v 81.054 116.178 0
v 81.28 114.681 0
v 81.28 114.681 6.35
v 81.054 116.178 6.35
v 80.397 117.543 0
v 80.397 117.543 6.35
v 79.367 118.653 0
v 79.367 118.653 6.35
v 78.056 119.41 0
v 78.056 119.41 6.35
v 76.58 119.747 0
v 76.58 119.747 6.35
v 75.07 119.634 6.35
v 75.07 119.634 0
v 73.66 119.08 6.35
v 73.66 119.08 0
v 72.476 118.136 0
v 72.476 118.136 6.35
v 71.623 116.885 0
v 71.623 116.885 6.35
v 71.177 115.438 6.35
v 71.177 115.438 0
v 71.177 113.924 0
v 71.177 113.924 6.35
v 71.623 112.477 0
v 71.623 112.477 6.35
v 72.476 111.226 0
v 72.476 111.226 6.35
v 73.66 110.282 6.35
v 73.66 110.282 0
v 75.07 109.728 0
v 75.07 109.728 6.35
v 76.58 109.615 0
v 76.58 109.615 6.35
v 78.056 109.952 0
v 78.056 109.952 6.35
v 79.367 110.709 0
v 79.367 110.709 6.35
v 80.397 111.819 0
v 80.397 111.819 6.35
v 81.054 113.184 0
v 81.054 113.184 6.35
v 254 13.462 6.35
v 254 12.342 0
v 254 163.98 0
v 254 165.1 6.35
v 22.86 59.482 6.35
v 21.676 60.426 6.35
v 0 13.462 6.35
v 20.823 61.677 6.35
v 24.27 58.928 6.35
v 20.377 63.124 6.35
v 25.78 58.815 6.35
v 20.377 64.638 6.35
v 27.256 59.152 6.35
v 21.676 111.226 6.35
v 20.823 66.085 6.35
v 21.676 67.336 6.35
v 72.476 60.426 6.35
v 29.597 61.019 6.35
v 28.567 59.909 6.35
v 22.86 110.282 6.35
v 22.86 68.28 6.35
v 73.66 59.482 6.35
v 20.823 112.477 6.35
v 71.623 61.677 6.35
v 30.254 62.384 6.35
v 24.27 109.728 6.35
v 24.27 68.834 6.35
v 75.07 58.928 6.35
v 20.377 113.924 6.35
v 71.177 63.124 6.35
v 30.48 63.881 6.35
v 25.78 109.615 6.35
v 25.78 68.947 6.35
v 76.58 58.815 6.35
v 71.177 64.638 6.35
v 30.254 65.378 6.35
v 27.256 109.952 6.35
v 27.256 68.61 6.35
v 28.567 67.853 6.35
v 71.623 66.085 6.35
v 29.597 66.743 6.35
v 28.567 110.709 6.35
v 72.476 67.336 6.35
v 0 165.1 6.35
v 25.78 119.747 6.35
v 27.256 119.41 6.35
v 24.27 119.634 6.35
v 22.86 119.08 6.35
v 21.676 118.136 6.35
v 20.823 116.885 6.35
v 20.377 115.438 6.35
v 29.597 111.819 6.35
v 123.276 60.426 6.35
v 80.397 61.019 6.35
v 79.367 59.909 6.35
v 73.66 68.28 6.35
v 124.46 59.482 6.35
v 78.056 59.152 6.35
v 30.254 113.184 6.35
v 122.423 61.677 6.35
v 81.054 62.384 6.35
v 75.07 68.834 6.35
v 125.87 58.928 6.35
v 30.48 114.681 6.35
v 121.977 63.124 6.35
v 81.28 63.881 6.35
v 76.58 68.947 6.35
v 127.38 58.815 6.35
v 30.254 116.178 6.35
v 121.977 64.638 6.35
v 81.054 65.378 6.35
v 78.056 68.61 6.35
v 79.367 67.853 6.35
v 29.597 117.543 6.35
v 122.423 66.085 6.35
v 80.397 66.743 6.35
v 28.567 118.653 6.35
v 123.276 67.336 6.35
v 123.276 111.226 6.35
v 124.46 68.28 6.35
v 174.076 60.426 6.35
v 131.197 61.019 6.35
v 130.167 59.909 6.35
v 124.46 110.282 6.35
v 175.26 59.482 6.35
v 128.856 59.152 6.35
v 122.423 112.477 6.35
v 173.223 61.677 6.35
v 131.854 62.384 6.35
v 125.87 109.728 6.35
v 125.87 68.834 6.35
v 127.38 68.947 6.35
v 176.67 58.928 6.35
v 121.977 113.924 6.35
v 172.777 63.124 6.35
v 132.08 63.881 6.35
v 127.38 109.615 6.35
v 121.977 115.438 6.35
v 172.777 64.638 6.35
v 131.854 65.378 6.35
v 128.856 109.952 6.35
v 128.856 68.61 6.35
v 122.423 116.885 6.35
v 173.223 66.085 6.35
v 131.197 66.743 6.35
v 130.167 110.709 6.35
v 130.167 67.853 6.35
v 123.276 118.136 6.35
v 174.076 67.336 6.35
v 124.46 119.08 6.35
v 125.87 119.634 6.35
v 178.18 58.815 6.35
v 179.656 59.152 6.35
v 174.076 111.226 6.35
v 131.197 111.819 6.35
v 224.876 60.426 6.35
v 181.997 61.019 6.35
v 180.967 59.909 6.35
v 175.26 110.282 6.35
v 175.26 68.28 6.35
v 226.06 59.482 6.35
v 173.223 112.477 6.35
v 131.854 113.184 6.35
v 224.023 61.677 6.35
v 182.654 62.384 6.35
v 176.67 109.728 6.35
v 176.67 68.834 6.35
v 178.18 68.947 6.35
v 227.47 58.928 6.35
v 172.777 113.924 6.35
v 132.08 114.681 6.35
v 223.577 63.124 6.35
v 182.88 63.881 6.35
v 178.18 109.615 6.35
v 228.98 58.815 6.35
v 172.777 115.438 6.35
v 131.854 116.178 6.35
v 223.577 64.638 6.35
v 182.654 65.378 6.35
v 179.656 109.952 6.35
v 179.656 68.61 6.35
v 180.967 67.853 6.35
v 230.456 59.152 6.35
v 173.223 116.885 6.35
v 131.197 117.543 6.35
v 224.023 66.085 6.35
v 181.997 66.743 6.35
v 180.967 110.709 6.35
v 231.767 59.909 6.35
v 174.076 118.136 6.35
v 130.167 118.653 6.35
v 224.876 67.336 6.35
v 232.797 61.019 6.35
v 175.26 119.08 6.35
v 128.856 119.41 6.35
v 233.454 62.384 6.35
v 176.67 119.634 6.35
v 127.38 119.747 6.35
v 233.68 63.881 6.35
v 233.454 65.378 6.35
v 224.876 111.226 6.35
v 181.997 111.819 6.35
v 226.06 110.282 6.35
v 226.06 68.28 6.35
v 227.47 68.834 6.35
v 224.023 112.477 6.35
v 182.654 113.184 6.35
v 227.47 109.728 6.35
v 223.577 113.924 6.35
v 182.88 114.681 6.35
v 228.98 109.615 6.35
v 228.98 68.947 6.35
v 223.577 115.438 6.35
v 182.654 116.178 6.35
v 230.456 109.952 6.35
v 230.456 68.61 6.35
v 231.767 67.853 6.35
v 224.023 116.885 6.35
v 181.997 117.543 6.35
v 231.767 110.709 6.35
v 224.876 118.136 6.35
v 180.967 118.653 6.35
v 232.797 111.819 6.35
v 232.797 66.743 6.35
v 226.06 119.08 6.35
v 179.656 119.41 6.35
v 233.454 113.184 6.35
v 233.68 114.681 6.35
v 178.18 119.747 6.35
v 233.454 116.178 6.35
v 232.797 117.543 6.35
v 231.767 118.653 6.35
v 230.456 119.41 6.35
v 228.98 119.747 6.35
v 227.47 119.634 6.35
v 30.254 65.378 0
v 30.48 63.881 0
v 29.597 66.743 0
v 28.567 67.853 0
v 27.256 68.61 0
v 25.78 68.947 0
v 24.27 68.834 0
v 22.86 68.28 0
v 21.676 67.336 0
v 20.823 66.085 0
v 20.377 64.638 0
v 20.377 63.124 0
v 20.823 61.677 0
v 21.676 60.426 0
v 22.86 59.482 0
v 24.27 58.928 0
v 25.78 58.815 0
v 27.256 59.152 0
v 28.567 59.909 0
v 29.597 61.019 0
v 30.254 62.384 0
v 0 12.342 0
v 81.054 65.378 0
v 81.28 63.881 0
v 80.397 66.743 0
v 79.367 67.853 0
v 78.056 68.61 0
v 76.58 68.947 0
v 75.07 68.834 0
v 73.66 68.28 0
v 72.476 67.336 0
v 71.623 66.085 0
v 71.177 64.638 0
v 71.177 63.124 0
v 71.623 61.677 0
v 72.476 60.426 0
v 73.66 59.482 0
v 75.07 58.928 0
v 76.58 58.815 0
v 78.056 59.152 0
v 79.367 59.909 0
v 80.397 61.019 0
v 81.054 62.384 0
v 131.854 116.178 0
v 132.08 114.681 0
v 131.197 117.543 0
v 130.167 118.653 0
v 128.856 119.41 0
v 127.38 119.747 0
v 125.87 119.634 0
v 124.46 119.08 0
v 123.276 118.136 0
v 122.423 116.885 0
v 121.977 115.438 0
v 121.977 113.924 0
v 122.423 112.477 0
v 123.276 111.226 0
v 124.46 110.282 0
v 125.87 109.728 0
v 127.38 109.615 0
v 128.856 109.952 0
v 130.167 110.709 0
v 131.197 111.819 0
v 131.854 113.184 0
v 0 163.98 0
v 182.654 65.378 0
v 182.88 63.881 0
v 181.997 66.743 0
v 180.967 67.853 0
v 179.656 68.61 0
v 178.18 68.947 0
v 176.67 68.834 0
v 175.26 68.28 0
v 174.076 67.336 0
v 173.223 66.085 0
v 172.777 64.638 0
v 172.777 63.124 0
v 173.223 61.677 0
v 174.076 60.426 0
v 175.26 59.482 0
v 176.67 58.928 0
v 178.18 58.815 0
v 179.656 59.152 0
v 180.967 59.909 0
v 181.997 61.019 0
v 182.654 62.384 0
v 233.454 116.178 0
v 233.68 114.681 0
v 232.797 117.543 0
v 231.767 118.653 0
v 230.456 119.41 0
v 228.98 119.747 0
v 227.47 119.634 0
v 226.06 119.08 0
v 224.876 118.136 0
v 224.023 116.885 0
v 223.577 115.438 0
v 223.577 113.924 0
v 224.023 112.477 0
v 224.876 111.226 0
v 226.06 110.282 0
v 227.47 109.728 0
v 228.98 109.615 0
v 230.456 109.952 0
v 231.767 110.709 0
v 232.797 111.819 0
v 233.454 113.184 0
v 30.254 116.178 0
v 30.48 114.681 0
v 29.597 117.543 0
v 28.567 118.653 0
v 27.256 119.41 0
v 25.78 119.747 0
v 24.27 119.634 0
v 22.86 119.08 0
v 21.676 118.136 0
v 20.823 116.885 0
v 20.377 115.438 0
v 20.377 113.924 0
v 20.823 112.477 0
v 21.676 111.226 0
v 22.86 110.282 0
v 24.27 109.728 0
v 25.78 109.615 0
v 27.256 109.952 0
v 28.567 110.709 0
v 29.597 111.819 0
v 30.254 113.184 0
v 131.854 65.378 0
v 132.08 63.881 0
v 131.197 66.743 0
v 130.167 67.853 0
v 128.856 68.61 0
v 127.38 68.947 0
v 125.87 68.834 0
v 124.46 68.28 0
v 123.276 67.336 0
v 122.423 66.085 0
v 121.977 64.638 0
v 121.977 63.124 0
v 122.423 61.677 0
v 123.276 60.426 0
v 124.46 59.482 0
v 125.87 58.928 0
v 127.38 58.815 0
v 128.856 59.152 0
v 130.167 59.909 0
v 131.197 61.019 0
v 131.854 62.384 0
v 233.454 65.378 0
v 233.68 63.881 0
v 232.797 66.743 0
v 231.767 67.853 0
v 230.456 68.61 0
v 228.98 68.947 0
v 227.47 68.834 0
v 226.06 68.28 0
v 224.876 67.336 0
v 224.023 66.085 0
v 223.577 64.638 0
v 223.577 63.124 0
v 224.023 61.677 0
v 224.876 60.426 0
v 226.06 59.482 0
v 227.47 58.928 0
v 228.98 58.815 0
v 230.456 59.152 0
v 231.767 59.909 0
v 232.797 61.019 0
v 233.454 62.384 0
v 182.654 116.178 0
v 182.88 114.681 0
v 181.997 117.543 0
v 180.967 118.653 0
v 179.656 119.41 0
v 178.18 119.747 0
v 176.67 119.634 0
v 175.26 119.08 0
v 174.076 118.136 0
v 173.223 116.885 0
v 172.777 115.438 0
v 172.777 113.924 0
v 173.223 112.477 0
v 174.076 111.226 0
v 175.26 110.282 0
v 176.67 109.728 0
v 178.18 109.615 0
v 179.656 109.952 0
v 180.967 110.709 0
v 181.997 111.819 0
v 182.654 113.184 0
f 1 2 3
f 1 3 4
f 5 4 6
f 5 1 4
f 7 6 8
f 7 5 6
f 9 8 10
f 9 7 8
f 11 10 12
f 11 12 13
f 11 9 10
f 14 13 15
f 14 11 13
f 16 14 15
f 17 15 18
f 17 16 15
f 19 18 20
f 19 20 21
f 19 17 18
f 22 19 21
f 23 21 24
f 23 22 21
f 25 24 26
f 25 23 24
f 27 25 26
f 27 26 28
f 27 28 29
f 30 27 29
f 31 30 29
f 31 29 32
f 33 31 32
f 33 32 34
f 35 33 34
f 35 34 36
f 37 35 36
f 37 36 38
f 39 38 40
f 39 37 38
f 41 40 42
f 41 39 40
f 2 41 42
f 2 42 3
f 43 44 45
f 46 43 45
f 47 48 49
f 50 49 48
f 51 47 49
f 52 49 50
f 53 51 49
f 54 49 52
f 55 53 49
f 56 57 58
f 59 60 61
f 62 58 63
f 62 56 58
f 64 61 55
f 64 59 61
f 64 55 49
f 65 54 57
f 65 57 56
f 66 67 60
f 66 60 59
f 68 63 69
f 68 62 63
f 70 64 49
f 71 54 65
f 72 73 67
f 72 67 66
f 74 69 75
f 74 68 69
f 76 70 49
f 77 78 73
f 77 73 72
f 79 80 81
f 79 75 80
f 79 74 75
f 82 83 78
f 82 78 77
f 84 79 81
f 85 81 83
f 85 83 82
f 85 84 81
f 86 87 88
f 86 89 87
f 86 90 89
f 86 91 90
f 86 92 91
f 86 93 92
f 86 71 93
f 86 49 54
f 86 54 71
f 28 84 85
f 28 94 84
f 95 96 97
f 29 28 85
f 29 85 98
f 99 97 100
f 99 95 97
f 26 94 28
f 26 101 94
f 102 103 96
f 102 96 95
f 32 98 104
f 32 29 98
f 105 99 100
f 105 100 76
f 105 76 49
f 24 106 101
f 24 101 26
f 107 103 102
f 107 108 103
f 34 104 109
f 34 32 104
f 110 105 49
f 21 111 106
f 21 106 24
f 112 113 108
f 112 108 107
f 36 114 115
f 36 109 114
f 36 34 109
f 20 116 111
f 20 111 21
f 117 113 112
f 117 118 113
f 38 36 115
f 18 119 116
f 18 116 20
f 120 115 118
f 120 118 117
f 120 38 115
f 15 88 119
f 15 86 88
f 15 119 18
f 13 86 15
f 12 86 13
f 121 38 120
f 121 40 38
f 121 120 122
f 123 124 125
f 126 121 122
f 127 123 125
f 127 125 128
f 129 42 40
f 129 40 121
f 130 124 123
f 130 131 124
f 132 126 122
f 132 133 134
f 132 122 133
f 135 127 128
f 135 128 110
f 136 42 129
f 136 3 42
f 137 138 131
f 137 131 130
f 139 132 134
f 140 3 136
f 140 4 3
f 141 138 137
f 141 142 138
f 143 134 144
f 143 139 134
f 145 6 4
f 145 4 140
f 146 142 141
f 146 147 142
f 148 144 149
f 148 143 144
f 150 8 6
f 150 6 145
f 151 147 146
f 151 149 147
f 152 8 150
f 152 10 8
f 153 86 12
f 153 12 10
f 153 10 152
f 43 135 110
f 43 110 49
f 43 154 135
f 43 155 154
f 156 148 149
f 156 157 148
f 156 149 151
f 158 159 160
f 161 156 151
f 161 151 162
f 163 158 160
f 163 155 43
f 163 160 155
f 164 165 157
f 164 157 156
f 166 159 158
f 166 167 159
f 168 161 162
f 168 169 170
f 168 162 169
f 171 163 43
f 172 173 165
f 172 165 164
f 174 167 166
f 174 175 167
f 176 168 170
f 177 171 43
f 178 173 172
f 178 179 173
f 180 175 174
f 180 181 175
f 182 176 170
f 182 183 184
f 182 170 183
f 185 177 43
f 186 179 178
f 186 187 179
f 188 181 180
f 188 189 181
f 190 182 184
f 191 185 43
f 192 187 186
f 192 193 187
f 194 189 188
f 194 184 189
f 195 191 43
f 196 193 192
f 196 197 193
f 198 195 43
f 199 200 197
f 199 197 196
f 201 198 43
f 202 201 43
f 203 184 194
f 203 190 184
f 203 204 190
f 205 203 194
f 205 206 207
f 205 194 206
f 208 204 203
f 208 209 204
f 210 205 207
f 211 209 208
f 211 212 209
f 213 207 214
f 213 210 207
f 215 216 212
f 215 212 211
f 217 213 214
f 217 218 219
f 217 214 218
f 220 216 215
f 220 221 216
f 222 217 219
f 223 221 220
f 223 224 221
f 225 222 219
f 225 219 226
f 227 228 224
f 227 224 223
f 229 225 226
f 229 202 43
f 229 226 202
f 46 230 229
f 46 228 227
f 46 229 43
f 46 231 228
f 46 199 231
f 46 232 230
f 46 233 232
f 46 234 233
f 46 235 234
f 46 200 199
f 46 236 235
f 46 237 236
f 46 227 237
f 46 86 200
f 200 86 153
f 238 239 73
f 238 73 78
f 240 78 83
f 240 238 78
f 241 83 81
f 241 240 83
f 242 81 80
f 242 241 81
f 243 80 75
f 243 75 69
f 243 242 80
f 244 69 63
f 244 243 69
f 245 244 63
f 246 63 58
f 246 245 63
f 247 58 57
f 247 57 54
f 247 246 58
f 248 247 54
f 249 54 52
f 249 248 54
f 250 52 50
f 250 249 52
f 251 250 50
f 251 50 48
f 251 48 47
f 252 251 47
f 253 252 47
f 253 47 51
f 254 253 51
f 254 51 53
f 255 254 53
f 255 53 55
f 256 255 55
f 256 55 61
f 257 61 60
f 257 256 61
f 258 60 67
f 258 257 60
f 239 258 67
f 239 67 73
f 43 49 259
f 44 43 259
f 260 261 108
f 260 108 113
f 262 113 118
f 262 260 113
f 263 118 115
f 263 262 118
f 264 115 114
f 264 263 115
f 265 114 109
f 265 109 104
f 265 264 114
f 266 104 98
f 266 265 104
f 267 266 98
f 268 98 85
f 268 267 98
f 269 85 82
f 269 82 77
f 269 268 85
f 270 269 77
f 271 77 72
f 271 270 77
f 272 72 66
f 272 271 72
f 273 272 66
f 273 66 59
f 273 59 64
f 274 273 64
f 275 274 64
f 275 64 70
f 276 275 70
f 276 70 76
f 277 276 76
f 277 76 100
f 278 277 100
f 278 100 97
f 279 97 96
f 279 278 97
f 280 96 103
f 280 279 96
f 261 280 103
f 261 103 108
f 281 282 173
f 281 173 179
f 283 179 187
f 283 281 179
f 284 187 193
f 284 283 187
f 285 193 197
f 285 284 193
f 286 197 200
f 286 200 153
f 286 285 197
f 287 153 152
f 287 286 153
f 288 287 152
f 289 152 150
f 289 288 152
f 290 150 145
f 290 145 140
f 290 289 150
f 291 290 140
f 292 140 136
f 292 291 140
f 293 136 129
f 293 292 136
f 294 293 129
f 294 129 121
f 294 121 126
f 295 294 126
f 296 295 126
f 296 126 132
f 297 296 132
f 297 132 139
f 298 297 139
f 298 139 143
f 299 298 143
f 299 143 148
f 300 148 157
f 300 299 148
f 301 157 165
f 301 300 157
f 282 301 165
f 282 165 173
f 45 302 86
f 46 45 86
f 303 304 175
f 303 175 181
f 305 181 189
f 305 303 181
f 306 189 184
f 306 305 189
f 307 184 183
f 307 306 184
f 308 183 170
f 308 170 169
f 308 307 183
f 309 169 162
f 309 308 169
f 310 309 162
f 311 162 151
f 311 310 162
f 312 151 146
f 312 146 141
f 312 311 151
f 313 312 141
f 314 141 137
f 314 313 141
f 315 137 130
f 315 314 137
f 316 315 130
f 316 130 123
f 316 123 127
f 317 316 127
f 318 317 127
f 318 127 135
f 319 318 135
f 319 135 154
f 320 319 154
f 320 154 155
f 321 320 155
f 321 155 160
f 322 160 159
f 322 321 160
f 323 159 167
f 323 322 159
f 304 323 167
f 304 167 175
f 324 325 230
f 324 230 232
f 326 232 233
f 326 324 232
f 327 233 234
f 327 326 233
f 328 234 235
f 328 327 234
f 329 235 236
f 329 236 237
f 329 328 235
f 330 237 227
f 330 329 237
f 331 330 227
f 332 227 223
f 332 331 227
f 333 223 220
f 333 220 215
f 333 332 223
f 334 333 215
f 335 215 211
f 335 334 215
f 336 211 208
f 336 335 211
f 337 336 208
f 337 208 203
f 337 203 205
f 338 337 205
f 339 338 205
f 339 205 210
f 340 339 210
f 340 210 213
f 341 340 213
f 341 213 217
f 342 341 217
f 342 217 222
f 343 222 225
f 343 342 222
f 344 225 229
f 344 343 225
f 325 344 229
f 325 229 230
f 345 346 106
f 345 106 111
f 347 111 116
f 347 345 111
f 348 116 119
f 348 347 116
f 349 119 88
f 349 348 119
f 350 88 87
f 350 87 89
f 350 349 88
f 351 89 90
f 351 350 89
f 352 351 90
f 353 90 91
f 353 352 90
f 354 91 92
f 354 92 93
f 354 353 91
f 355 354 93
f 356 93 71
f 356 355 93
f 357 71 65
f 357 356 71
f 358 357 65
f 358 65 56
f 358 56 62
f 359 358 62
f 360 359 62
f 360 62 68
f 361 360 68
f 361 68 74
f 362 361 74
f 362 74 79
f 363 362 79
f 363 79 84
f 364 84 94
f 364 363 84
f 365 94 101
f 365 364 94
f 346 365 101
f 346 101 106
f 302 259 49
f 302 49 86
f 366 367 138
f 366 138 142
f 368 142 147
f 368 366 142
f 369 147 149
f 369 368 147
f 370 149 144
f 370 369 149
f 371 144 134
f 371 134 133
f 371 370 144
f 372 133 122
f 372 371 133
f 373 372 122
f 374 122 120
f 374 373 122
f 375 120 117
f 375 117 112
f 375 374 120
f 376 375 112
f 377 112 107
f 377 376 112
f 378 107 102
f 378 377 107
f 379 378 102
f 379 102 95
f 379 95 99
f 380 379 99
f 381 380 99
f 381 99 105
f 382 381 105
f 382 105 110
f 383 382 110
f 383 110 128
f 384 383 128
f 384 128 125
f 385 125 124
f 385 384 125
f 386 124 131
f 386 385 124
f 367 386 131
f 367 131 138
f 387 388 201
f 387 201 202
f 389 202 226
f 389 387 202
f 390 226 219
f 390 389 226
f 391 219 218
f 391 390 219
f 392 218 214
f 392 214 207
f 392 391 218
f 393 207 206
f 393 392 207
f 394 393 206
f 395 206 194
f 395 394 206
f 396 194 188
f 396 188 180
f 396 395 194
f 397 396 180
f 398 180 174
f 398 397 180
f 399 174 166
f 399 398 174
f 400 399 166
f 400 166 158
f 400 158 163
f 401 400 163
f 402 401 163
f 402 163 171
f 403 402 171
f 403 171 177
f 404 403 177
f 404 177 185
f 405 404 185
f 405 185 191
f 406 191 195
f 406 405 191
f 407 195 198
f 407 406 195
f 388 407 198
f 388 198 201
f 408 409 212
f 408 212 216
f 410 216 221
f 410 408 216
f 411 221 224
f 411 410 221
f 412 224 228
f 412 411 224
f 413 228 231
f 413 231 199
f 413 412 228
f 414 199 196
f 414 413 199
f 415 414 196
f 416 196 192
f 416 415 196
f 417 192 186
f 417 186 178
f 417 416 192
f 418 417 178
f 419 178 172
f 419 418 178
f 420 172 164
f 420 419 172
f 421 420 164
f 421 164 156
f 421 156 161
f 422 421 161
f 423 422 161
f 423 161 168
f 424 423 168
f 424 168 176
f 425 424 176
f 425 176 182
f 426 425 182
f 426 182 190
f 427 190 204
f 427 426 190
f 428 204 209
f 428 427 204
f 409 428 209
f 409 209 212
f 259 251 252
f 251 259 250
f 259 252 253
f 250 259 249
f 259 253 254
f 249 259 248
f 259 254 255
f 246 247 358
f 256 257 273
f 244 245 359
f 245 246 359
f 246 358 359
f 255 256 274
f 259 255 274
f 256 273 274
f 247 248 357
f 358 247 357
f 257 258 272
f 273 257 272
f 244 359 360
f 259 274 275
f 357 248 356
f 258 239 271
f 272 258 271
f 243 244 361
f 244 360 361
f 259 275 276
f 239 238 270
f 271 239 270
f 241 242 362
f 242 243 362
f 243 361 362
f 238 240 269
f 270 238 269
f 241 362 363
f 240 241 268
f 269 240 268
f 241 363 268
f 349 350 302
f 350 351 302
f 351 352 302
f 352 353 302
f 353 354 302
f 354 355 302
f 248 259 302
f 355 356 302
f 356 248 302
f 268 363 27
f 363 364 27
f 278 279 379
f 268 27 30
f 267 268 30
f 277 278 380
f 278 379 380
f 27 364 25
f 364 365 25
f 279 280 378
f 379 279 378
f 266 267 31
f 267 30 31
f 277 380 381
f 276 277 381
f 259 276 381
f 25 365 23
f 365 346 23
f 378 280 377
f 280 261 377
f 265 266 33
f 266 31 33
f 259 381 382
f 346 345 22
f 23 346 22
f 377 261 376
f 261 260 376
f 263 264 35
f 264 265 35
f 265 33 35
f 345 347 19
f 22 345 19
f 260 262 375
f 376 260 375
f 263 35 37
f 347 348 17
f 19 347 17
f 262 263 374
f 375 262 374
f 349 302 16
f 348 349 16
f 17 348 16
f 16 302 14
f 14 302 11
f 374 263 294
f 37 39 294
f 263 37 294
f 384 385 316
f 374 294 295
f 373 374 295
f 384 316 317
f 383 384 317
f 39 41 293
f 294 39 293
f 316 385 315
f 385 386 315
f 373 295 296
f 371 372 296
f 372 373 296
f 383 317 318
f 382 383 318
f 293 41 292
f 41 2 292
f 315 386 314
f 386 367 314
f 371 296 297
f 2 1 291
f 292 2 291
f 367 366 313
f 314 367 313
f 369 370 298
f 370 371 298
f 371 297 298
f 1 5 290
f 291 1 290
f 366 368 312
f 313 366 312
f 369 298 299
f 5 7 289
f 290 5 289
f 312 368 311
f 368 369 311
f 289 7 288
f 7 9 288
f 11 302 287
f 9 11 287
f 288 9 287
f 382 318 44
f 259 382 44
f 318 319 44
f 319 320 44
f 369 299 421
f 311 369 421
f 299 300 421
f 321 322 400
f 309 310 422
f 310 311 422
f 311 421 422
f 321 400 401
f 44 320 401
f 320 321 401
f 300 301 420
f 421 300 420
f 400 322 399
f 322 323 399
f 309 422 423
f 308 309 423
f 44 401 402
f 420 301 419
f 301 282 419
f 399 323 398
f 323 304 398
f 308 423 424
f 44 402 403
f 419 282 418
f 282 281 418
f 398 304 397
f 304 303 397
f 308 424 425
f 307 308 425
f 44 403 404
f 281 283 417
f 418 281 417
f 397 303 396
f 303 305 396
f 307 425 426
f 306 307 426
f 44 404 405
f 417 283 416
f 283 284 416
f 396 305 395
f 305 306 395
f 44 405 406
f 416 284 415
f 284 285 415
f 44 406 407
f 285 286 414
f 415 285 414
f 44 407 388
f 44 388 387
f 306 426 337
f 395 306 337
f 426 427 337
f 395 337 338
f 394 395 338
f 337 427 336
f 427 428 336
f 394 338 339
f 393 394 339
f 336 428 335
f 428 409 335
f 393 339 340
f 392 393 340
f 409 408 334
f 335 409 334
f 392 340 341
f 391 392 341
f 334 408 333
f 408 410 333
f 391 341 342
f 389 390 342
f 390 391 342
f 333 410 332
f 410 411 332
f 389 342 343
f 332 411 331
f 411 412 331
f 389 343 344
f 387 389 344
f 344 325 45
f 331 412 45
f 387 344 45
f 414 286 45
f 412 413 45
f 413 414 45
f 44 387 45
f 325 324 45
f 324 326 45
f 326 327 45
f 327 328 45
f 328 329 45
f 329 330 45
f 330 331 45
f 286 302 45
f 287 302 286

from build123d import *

# Parameters (mm, degrees)
F0_W     = 254
F0_H     = 165.1
F0_R     = 5.08
F1_DEPTH = 6.35
F3_DEPTH = 254.001
F5_DEPTH = 254.001


with BuildPart() as f1:
    # F0 (on Top) → F1 (new body)
    with BuildSketch(Plane.XY):
        with Locations((127, 82.55)):
            Rectangle(F0_W, F0_H)
        with Locations((25.4, 63.881)):
            Circle(F0_R, mode=Mode.SUBTRACT)
        with Locations((76.2, 63.881)):
            Circle(F0_R, mode=Mode.SUBTRACT)
        with Locations((127, 63.881)):
            Circle(F0_R, mode=Mode.SUBTRACT)
        with Locations((177.8, 63.881)):
            Circle(F0_R, mode=Mode.SUBTRACT)
        with Locations((228.6, 63.881)):
            Circle(F0_R, mode=Mode.SUBTRACT)
        with Locations((25.4, 114.681)):
            Circle(F0_R, mode=Mode.SUBTRACT)
        with Locations((76.2, 114.681)):
            Circle(F0_R, mode=Mode.SUBTRACT)
        with Locations((127, 114.681)):
            Circle(F0_R, mode=Mode.SUBTRACT)
        with Locations((177.8, 114.681)):
            Circle(F0_R, mode=Mode.SUBTRACT)
        with Locations((228.6, 114.681)):
            Circle(F0_R, mode=Mode.SUBTRACT)
    extrude(amount=F1_DEPTH)

    # F2 (on face) → F3 (cut, through all)
    with BuildSketch(Plane(origin=(0, 0, 0), x_dir=(0, -1, 0), z_dir=(-1, 0, 0))):
        Polygon((-163.9803236725, 0), (-165.1, 6.35), (-165.1, 0), align=None)
    extrude(amount=-F3_DEPTH, mode=Mode.SUBTRACT)

    # F4 (on face) → F5 (cut, through all)
    with BuildSketch(Plane(origin=(0, 0, 0), x_dir=(0, -1, 0), z_dir=(-1, 0, 0))):
        Polygon((0, 6.35), (-13.462, 6.35), (-12.3423236725, 0), (0, 0), align=None)
        Polygon((0, 0), (-12.3423236725, 0), (19.5333006358, -180.7756486286), (19.5333006358, 6.35), (0, 6.35), align=None)
    extrude(amount=-F5_DEPTH, mode=Mode.SUBTRACT)


solid = f1.part
